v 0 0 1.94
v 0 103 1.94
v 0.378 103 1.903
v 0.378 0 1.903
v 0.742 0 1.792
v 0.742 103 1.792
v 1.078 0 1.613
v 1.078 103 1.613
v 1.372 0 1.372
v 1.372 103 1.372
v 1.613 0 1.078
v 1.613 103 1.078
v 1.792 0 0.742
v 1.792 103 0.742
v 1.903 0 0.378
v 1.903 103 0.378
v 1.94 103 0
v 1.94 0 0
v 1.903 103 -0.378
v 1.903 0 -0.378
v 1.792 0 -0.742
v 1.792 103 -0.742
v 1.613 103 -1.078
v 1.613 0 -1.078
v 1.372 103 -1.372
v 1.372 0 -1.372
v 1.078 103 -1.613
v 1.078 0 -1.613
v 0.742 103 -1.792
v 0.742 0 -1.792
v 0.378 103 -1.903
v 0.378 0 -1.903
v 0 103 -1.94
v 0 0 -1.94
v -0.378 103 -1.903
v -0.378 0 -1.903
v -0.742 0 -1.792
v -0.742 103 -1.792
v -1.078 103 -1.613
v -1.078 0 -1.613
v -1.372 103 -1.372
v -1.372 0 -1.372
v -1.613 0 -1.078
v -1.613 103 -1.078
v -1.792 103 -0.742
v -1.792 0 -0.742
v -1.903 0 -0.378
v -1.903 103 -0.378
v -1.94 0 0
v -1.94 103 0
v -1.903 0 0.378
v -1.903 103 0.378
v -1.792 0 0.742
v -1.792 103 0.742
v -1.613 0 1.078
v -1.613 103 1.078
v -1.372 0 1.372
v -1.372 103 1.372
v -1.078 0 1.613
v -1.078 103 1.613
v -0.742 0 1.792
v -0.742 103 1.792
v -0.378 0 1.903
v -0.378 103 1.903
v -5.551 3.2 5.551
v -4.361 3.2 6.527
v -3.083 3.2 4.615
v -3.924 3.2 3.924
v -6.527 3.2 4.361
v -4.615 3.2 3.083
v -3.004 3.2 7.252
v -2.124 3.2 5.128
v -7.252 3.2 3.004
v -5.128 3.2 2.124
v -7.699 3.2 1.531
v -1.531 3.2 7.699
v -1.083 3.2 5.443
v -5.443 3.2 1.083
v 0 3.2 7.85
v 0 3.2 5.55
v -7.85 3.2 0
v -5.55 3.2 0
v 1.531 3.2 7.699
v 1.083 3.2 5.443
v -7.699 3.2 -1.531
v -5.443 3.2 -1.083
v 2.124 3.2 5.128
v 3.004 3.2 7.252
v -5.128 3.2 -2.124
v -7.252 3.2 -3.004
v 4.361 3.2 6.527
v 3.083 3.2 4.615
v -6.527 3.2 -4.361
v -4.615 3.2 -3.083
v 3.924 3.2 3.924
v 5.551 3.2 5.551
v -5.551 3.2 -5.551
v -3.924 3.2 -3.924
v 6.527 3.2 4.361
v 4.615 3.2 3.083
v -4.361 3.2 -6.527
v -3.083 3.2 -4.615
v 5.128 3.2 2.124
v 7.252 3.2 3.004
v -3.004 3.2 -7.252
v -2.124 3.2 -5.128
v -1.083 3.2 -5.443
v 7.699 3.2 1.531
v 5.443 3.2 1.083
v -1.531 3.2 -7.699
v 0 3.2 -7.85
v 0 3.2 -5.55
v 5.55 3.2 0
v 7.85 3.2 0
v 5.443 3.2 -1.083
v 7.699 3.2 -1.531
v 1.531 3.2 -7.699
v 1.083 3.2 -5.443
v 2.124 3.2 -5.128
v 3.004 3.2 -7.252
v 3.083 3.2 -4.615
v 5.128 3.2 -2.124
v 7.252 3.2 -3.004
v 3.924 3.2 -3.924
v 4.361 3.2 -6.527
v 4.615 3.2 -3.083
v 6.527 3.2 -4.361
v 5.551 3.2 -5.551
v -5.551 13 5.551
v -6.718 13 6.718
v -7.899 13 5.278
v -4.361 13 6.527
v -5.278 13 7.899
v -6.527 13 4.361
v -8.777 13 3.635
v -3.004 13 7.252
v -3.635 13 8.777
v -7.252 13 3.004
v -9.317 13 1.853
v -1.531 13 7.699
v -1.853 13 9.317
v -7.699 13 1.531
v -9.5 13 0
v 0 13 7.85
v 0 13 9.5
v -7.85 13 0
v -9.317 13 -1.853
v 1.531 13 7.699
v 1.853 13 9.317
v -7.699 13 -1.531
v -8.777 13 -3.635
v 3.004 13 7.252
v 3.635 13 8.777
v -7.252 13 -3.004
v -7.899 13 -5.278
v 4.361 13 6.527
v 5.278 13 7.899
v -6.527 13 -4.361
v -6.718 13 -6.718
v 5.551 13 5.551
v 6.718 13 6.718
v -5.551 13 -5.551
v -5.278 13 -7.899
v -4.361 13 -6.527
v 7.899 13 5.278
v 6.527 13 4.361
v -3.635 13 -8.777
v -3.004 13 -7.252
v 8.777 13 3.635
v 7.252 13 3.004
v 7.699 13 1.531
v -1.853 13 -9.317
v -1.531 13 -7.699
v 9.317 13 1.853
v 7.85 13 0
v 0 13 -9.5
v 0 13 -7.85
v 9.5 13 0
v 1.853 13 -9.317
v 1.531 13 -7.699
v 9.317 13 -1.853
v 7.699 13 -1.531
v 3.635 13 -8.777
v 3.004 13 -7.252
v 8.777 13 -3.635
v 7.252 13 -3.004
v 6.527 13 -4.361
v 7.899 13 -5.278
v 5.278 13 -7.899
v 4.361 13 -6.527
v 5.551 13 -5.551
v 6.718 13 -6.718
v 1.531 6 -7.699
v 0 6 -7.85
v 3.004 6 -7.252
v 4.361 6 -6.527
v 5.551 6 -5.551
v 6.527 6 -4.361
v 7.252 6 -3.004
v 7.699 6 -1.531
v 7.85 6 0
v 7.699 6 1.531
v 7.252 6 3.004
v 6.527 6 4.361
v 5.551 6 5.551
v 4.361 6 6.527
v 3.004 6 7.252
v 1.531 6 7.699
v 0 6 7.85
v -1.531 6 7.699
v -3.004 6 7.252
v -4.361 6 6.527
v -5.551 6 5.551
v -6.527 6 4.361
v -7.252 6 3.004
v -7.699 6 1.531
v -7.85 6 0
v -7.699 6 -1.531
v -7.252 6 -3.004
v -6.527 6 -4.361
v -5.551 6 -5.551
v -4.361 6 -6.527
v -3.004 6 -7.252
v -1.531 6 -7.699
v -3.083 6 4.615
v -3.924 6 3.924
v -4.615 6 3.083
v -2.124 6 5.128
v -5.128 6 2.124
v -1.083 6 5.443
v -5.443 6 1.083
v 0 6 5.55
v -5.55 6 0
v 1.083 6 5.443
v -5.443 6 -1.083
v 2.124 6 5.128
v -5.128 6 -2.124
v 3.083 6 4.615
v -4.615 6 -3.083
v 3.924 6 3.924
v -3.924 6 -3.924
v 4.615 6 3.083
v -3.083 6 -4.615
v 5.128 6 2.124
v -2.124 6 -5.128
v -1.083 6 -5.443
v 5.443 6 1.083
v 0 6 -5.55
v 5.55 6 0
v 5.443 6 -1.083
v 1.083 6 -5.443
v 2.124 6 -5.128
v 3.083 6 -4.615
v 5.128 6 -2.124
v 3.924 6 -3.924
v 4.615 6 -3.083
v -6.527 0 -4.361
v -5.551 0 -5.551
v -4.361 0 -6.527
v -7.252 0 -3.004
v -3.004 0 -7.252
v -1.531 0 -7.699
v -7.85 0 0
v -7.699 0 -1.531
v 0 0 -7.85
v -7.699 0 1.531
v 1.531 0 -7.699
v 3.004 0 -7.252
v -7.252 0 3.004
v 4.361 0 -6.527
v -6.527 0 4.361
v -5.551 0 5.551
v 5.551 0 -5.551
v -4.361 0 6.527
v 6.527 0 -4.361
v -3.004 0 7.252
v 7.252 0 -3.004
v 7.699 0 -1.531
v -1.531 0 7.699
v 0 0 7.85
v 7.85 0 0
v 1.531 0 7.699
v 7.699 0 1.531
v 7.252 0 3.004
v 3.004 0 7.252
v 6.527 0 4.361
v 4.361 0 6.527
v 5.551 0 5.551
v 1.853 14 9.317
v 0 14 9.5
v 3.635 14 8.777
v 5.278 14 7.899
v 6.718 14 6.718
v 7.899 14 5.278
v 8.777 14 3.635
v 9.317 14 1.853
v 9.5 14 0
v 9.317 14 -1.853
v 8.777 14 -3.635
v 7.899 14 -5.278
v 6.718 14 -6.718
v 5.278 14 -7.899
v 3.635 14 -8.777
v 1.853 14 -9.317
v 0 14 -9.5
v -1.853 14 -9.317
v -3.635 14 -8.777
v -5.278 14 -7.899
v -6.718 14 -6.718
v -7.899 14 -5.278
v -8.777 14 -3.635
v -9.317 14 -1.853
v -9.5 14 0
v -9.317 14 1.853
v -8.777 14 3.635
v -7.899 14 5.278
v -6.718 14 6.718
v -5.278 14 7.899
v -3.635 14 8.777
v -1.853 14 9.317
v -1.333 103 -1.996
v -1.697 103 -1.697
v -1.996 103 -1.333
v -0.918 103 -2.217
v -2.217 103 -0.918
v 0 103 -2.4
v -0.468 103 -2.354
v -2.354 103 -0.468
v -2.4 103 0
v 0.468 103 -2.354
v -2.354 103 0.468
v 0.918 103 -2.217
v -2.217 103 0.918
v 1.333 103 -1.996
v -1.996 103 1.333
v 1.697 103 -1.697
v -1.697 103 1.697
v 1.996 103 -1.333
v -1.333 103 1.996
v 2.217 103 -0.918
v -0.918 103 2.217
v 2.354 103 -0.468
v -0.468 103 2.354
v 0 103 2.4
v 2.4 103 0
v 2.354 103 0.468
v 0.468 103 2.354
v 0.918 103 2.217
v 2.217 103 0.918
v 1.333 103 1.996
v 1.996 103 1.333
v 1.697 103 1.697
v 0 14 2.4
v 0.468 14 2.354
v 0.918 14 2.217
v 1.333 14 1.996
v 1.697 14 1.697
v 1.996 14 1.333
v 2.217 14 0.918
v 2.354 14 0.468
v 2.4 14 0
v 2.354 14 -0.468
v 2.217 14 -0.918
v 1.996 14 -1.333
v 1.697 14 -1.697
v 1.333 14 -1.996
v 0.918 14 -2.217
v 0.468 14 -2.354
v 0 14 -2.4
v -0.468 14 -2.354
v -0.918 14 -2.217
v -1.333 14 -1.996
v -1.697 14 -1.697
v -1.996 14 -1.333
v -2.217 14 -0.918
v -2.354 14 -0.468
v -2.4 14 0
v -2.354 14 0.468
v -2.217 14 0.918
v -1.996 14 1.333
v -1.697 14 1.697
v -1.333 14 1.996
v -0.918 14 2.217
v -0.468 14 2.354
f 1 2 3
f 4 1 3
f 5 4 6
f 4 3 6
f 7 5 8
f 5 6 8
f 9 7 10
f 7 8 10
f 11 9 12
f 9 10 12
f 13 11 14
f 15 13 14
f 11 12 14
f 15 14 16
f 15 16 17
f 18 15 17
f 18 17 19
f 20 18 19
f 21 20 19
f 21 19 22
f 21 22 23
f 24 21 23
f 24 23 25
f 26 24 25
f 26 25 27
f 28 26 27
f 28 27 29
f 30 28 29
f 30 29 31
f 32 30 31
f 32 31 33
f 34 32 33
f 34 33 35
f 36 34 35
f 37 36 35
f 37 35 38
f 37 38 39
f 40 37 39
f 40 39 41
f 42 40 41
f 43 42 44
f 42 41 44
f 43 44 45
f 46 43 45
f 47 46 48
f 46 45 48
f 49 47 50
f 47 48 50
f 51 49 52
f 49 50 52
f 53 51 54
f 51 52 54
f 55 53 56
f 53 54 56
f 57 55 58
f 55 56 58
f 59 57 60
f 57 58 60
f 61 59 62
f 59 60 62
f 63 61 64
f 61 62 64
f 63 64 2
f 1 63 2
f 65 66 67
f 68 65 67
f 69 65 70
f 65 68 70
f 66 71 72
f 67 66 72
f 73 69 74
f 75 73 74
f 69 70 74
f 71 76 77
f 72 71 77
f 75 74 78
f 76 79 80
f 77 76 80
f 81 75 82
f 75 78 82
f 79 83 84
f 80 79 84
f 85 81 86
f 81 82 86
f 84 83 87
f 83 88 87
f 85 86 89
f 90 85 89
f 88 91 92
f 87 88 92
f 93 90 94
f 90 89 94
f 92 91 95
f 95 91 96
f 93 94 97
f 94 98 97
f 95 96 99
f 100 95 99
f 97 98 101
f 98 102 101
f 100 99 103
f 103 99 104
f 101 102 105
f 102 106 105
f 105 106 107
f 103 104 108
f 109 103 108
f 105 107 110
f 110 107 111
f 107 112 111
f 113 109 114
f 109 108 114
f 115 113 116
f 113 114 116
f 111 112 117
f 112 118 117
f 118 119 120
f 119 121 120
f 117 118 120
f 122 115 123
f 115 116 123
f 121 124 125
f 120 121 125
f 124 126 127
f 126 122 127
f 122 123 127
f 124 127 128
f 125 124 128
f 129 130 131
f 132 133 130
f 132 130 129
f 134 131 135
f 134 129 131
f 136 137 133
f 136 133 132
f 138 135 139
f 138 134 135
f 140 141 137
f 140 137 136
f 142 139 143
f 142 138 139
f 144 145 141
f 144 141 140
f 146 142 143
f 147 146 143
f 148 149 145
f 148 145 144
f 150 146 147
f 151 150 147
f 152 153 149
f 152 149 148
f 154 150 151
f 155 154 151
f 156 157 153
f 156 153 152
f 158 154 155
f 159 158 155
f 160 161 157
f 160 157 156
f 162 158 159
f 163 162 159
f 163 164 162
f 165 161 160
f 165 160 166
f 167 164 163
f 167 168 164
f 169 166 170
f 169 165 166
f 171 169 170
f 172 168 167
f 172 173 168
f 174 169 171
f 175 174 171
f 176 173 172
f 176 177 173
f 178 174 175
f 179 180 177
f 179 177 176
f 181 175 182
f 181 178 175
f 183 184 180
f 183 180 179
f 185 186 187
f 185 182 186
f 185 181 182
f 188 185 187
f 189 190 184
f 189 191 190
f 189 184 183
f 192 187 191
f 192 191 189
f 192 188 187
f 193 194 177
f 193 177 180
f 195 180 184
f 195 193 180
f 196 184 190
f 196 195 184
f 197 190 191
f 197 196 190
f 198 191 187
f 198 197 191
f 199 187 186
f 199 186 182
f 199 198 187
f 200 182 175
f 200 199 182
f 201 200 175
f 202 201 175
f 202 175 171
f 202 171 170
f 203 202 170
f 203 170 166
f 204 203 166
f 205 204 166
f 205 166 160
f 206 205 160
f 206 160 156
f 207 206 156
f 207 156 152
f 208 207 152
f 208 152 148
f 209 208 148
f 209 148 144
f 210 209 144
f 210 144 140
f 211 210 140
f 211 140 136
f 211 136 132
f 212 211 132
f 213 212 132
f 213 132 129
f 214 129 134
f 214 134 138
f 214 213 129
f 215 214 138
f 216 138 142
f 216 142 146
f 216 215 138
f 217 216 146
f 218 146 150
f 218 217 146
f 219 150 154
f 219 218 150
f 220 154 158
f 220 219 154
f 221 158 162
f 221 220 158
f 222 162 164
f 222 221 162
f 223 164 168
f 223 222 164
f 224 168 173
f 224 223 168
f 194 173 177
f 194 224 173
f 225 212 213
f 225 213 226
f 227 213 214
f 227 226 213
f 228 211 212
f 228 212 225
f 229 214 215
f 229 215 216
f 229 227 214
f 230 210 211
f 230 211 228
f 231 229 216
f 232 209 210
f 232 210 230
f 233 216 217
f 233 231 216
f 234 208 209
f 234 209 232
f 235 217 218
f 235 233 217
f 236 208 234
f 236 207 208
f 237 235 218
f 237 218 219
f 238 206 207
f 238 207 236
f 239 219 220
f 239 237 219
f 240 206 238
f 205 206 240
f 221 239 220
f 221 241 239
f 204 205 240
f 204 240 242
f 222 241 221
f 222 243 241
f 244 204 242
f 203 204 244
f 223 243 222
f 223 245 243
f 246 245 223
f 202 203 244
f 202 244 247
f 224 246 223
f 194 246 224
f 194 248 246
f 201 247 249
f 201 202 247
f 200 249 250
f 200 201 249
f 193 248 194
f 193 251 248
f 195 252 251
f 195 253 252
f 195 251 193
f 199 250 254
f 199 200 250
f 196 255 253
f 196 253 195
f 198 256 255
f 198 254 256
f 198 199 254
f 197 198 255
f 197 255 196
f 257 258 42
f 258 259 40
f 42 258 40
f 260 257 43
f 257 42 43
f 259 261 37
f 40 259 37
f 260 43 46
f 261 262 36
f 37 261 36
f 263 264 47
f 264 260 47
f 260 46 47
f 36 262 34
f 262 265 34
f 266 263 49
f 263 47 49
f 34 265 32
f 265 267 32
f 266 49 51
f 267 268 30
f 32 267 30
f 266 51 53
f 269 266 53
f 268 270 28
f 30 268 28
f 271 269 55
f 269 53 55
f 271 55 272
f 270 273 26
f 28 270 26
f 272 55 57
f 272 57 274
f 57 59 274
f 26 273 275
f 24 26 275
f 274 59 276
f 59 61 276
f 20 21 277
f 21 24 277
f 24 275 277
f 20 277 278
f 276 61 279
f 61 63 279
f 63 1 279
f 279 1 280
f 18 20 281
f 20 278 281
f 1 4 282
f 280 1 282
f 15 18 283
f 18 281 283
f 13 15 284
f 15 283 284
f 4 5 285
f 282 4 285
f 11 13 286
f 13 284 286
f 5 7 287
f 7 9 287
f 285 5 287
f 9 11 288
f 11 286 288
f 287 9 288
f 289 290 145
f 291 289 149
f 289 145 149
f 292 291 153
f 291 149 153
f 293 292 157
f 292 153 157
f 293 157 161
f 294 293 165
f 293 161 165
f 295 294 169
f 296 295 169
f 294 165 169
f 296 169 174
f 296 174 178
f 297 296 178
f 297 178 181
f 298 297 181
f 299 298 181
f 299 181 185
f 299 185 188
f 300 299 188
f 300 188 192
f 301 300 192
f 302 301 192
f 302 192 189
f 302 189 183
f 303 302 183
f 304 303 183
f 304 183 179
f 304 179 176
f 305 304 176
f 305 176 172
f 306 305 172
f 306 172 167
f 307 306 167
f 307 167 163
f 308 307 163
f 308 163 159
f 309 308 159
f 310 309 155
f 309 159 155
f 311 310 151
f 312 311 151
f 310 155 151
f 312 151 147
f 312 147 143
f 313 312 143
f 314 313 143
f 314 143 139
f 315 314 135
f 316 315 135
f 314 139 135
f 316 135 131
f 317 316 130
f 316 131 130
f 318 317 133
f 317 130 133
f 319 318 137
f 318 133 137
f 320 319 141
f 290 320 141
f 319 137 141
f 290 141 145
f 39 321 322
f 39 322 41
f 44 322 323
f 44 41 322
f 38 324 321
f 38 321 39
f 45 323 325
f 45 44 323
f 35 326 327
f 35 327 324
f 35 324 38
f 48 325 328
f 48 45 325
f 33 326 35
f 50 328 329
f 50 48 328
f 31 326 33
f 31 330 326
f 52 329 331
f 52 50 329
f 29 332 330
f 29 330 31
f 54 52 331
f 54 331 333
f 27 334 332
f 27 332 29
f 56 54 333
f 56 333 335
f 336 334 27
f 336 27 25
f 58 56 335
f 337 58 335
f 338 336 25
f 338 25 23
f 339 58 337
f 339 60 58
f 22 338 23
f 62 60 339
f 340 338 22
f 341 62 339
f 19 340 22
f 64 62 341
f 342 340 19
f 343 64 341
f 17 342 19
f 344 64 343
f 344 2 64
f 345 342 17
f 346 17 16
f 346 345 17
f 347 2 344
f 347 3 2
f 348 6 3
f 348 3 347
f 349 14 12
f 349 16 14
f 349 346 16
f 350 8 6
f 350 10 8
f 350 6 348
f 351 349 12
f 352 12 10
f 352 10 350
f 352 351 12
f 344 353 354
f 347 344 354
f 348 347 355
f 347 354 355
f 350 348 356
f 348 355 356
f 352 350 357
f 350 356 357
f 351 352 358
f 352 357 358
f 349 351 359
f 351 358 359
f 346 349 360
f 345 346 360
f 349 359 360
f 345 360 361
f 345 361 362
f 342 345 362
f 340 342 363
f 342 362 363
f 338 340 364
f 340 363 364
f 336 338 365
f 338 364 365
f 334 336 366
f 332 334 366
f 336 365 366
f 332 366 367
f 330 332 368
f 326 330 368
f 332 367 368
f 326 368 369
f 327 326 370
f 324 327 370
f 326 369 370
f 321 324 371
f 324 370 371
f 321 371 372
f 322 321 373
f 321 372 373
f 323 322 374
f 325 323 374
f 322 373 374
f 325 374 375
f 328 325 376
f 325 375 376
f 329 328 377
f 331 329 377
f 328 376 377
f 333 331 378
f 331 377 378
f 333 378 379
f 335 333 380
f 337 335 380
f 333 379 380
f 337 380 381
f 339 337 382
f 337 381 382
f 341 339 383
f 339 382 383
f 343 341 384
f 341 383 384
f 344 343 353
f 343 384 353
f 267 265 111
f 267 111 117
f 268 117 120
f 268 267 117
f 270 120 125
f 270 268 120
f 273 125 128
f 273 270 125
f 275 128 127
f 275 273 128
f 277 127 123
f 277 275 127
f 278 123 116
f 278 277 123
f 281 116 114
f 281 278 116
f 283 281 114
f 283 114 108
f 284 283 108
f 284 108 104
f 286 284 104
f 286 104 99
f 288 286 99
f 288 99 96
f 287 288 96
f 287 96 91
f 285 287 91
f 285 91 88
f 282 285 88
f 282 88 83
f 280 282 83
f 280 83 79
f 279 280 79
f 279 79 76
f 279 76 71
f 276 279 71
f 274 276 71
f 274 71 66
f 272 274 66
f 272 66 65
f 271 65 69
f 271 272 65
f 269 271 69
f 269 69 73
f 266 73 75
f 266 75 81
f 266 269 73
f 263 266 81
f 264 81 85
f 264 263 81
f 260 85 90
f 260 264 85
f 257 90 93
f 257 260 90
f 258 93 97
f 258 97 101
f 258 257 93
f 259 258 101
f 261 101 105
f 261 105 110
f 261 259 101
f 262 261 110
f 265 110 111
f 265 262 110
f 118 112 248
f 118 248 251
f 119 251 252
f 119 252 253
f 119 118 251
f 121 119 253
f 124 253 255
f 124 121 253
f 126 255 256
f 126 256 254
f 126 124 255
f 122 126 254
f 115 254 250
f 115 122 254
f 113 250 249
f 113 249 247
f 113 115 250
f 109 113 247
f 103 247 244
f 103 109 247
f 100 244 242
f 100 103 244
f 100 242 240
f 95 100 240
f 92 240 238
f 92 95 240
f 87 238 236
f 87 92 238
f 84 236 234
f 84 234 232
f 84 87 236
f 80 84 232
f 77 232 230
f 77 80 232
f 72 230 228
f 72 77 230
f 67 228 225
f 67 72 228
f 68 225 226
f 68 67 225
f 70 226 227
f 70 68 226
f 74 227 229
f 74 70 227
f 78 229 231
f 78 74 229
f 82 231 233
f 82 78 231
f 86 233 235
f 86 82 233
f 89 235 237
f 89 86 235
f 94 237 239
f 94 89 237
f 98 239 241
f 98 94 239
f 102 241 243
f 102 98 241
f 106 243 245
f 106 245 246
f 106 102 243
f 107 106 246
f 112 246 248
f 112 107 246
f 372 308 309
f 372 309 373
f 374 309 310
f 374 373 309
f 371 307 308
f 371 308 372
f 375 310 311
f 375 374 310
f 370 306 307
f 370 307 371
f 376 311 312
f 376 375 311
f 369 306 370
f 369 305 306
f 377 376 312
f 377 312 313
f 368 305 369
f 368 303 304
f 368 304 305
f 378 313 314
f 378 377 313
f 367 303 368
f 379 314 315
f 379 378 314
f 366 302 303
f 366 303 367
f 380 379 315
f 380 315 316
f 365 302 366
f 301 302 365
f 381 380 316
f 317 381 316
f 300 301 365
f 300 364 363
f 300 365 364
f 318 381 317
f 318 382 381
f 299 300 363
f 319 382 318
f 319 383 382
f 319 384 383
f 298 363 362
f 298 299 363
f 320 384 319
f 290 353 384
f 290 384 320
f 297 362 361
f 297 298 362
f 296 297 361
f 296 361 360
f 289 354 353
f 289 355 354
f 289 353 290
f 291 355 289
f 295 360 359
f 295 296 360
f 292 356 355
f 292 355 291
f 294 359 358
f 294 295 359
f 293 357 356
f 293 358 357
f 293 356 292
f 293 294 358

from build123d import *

# Parameters (mm, degrees)
SKETCH1_R           = 9.5
BOSS_EXTRUDE1_DEPTH = 14
SKETCH2_R           = 2.4
BOSS_EXTRUDE2_DEPTH = 89
SKETCH3_R           = 1.94
CUT_EXTRUDE1_DEPTH  = 104.872518021
SKETCH4_R           = 9.5
SKETCH4_R_2         = 7.85
CUT_EXTRUDE2_DEPTH  = 13
CUT_EXTRUDE3_START  = -3.2
SKETCH5_R           = 7.85
SKETCH5_R_2         = 5.55
CUT_EXTRUDE3_DEPTH  = 2.8


with BuildPart() as part:
    # Sketch1 → Boss-Extrude1 (new body)
    with BuildSketch(Plane(origin=(0, 0, 0), x_dir=(1, 0, 0), z_dir=(0, 1, 0))):
        with Locations(Location((0, 0, 0), (0, 0, 270))):
            Circle(SKETCH1_R)
    extrude(amount=BOSS_EXTRUDE1_DEPTH)

    # Sketch2 → Boss-Extrude2 (add)
    with BuildSketch(Plane(origin=(0, 14, 0), x_dir=(1, 0, 0), z_dir=(0, 1, 0))):
        with Locations(Location((0, 0, 0), (0, 0, 270))):
            Circle(SKETCH2_R)
    extrude(amount=BOSS_EXTRUDE2_DEPTH)

    # Sketch3 → Cut-Extrude1 (cut, through all)
    with BuildSketch(Plane(origin=(0, 103, 0), x_dir=(1, 0, 0), z_dir=(0, 1, 0))):
        with Locations(Location((0, 0, 0), (0, 0, 270))):
            Circle(SKETCH3_R)
    extrude(amount=-CUT_EXTRUDE1_DEPTH, mode=Mode.SUBTRACT)

    # Sketch4 → Cut-Extrude2 (cut)
    with BuildSketch(Plane.XZ):
        with Locations(Location((0, 0, 0), (0, 0, 270))):
            Circle(SKETCH4_R)
        with Locations(Location((0, 0, 0), (0, 0, 270))):
            Circle(SKETCH4_R_2, mode=Mode.SUBTRACT)
    extrude(amount=-CUT_EXTRUDE2_DEPTH, mode=Mode.SUBTRACT)

    # Sketch5 → Cut-Extrude3 (cut)
    with BuildSketch(Plane.XZ.offset(CUT_EXTRUDE3_START)):
        with Locations(Location((0, 0, 0), (0, 0, 270))):
            Circle(SKETCH5_R)
        with Locations(Location((0, 0, 0), (0, 0, 270))):
            Circle(SKETCH5_R_2, mode=Mode.SUBTRACT)
    extrude(amount=-CUT_EXTRUDE3_DEPTH, mode=Mode.SUBTRACT)


solid = part.part
